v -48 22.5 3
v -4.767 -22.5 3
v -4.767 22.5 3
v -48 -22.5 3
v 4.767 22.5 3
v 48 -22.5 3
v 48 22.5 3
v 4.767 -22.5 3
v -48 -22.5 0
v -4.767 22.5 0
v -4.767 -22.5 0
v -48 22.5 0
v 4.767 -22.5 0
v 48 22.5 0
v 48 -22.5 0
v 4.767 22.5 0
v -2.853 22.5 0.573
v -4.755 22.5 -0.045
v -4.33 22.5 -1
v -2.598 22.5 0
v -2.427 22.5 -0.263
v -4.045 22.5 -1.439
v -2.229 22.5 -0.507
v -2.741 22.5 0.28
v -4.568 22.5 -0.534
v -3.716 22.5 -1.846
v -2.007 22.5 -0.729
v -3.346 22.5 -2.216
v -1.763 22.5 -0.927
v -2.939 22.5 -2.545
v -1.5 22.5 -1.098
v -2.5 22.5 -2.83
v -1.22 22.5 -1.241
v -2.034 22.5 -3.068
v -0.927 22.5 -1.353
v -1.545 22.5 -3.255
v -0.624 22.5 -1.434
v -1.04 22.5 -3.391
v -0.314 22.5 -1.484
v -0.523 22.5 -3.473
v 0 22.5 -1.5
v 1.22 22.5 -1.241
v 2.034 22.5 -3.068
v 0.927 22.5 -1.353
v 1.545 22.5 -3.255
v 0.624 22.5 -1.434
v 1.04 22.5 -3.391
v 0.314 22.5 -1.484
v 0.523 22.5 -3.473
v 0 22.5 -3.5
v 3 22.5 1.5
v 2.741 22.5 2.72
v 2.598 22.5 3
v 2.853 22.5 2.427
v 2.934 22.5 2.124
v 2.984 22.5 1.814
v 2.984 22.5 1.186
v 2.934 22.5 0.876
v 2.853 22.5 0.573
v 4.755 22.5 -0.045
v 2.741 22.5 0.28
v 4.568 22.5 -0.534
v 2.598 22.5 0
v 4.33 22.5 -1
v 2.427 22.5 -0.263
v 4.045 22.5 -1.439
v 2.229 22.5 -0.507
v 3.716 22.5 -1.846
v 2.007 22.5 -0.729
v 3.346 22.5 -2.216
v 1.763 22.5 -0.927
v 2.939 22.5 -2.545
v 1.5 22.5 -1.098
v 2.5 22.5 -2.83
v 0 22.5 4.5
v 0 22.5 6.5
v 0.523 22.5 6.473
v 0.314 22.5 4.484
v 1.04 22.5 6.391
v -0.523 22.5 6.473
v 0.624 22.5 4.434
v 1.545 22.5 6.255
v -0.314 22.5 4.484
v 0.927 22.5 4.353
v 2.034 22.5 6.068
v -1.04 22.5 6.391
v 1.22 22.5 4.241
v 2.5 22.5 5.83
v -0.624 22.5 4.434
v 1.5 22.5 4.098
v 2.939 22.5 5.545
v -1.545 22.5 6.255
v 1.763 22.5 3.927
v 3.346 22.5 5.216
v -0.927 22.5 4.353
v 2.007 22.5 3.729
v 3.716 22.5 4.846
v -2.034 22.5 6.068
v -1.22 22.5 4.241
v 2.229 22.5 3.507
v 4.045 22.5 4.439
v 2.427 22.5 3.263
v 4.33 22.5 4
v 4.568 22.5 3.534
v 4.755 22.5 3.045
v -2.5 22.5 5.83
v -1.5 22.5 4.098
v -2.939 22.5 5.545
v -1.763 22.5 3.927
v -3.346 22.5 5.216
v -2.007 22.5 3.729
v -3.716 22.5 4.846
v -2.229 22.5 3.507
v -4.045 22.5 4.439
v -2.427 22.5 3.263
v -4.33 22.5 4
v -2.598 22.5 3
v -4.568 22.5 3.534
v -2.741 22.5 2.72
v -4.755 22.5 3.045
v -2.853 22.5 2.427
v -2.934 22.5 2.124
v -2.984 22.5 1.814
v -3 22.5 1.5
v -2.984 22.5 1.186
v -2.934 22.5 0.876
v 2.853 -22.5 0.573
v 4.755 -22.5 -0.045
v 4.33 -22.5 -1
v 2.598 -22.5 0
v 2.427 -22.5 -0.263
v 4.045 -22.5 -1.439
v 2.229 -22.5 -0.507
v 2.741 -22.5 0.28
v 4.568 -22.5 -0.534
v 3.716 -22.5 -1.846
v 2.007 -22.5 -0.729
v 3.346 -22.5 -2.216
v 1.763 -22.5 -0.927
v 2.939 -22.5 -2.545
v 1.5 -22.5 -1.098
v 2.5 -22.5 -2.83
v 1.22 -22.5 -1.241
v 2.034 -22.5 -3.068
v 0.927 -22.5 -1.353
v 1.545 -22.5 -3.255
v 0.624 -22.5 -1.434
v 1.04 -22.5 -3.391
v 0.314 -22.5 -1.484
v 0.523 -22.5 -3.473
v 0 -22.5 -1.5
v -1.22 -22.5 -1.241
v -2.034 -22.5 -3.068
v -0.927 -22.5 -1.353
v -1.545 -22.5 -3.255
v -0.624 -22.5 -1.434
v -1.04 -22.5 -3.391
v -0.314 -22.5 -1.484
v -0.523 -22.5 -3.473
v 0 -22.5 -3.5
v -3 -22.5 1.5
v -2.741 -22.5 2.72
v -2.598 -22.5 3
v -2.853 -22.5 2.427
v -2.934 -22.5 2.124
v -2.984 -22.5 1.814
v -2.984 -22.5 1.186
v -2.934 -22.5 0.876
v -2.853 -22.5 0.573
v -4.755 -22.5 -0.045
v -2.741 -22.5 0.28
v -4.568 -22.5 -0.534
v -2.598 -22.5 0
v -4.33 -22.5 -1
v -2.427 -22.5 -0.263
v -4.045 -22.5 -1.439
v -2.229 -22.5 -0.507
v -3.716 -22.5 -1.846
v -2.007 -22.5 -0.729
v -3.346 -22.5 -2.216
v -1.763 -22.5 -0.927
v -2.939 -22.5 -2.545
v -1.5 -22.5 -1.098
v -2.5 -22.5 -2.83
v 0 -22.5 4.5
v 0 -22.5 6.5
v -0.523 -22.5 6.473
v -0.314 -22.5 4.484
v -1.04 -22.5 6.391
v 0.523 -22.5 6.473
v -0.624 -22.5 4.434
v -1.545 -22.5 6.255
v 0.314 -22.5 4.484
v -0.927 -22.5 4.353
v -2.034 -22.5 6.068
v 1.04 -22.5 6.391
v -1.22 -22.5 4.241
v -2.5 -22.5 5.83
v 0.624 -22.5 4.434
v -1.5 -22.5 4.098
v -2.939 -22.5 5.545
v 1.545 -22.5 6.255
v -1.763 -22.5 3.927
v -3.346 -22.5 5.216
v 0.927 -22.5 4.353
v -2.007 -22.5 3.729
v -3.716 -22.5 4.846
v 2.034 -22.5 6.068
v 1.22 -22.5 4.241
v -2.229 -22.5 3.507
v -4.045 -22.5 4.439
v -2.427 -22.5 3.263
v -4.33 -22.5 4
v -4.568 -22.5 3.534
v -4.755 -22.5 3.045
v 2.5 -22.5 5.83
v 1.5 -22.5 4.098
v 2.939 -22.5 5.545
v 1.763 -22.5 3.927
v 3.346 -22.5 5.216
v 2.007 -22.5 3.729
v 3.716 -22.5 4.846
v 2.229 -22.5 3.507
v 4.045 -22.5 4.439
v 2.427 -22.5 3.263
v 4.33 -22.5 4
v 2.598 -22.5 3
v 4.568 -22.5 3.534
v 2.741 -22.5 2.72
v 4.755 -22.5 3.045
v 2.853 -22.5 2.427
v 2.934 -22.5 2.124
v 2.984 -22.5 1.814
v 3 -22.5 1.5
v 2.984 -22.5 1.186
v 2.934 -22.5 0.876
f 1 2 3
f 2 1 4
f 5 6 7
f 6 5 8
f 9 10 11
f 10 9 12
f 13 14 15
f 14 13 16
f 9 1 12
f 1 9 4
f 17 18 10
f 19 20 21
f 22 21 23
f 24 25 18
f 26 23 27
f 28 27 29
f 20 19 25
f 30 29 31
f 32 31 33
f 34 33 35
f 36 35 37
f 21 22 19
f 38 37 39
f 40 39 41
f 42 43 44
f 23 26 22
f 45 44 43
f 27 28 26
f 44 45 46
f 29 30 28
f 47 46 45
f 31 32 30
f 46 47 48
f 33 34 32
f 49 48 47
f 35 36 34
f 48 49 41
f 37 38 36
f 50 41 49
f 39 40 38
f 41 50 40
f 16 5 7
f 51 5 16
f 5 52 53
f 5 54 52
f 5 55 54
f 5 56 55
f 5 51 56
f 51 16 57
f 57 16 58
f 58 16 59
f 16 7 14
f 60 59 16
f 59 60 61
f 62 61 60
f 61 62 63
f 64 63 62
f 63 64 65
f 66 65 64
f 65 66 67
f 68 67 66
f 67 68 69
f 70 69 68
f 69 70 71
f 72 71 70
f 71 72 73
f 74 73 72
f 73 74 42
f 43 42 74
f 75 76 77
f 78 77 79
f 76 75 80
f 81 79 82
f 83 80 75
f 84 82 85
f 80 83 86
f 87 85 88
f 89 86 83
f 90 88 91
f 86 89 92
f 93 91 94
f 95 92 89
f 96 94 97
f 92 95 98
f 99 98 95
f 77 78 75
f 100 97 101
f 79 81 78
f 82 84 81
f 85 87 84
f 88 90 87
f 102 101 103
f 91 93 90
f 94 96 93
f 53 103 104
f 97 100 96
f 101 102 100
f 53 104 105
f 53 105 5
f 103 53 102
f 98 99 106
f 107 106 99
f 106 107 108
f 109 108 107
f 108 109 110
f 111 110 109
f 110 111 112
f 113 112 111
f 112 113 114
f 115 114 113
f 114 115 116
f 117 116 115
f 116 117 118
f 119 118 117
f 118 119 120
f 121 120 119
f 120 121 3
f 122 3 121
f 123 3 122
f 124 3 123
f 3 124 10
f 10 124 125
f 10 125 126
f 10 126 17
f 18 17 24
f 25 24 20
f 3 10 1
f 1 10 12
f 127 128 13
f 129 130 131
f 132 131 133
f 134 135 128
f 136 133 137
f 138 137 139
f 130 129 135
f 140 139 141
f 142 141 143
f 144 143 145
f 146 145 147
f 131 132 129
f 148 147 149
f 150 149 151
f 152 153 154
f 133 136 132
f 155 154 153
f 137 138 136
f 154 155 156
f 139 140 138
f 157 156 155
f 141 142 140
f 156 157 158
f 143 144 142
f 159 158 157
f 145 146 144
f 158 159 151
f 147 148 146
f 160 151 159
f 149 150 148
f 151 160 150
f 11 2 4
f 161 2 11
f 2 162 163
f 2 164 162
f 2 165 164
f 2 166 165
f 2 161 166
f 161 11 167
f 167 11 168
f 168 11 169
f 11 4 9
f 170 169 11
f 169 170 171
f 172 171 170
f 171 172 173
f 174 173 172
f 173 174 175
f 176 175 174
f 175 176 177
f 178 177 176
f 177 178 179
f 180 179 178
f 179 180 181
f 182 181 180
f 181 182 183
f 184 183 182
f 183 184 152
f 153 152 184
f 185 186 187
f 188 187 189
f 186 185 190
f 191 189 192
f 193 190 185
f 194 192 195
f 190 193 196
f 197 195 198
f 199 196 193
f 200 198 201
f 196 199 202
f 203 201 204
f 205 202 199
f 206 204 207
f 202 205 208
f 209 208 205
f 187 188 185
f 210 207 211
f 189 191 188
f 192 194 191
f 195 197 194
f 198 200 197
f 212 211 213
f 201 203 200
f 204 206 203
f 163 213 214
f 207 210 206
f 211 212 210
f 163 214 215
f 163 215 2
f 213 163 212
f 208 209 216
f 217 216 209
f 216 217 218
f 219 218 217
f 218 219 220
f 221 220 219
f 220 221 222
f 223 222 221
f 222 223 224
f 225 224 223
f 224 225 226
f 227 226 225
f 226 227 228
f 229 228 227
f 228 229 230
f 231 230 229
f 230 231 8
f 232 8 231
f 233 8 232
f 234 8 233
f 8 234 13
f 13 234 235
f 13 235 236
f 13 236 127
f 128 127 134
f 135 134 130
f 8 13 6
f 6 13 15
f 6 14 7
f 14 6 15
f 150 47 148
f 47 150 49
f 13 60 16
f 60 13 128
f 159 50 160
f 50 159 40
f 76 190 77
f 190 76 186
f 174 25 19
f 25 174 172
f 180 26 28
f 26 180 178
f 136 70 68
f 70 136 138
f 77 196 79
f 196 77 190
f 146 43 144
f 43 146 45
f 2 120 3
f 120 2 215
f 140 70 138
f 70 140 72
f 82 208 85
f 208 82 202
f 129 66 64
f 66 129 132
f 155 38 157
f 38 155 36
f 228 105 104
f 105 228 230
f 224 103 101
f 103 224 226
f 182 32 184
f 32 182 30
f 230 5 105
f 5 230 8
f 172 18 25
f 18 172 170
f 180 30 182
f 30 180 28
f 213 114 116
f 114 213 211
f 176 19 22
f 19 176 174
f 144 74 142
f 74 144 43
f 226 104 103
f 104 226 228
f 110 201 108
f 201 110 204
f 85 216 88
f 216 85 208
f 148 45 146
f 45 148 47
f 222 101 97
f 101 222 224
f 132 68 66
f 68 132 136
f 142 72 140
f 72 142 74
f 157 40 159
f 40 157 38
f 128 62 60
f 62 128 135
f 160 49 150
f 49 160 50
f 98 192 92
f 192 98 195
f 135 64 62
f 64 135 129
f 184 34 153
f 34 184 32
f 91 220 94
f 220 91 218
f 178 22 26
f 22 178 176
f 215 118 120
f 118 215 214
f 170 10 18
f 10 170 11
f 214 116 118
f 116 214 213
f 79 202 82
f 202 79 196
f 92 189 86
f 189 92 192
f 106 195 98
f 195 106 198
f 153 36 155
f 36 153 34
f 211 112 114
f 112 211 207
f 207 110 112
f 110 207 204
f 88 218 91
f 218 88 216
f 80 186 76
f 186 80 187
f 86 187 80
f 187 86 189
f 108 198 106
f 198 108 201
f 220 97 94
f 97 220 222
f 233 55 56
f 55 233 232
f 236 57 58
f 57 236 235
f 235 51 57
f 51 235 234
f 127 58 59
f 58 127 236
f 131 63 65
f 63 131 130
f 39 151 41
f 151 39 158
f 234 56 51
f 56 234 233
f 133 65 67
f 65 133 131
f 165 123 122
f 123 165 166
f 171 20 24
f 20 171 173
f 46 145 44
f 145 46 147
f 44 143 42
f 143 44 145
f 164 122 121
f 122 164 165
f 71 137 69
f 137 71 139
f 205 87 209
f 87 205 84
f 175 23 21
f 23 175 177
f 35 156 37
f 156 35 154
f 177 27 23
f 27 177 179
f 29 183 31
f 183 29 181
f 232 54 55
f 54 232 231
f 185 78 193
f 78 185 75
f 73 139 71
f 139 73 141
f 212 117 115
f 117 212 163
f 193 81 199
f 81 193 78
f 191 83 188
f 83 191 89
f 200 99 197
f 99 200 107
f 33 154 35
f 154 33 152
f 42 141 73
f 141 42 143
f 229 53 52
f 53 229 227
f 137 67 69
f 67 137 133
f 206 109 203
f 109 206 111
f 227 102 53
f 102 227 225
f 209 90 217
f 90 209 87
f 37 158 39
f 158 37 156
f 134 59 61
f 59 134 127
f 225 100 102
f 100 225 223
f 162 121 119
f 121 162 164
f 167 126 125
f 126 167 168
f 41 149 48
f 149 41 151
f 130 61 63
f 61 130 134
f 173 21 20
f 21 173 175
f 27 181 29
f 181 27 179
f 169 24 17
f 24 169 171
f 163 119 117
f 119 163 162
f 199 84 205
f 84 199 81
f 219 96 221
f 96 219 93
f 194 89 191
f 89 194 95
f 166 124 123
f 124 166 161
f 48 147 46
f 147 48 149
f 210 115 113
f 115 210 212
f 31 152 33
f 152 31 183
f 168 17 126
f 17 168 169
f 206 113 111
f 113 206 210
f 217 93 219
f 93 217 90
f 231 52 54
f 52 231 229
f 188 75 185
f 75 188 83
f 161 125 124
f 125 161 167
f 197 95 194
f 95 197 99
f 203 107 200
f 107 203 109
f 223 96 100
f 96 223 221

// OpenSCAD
// Compact plate hinge.
$fn = 60;
eps = 0.02;
leaf_l = 48;
width = 45;
pin_d = 6;
leaf_t = 3;
difference() {
    union() {
        translate([-leaf_l,-width/2,0]) cube([leaf_l,width,leaf_t]);
        translate([0,-width/2,0]) cube([leaf_l,width,leaf_t]);
        translate([0,-width/2,leaf_t/2]) rotate([-90,0,0]) cylinder(d=pin_d+4,h=width);
    }
    translate([0,-width/2-eps,leaf_t/2]) rotate([-90,0,0]) cylinder(d=pin_d,h=width+2*eps);
}
